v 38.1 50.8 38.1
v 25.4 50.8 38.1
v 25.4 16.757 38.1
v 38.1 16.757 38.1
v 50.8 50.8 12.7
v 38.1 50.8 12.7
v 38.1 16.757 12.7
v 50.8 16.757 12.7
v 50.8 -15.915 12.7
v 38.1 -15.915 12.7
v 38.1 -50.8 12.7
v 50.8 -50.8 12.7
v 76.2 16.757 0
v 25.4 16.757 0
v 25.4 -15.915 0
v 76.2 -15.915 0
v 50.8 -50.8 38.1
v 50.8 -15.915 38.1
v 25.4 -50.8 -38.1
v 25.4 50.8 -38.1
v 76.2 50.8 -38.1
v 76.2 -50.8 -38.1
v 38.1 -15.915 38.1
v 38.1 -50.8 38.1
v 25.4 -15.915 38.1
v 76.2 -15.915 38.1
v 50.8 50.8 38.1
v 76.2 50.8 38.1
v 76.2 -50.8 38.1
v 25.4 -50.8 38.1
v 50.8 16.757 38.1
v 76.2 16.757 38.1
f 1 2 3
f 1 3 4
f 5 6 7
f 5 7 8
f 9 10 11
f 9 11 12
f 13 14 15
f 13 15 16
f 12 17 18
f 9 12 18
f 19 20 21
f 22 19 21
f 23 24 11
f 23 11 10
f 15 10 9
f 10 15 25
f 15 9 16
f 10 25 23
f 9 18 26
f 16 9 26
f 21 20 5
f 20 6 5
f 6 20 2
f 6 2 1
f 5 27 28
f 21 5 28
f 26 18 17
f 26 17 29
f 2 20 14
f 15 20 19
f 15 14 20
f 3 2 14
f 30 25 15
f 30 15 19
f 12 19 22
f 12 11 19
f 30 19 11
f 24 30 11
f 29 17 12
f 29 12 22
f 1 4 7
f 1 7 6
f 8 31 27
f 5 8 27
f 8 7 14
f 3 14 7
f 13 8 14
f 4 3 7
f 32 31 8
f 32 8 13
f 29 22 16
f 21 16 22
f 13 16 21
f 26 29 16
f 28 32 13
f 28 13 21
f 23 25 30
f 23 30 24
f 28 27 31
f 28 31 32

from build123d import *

# Parameters (mm, degrees)
F0_W     = 152.4
F0_H     = 101.6
F1_DEPTH = 38.1
F2_W     = 12.7
F2_H     = 101.6
F3_DEPTH = 25.4
F4_W     = 152.4
F4_H     = 32.6725877821
F5_DEPTH = 38.1
F6_W     = 12.7
F6_H     = 34.8848986059
F7_DEPTH = 76.201


with BuildPart() as f1:
    # F0 (on Top) → F1 (new body, symmetric)
    with BuildSketch(Plane.XY):
        Rectangle(F0_W, F0_H)
    extrude(amount=F1_DEPTH, both=True)

    # F2 (on face) → F3 (cut)
    with BuildSketch(Plane.XY.offset(38.1)):
        with Locations((44.45, 0)):
            Rectangle(F2_W, F2_H)
    extrude(amount=-F3_DEPTH, mode=Mode.SUBTRACT)

    # F4 (on face) → F5 (cut)
    with BuildSketch(Plane.XY.offset(38.1)):
        with Locations((0, 0.421192497)):
            Rectangle(F4_W, F4_H)
    extrude(amount=-F5_DEPTH, mode=Mode.SUBTRACT)

    # F6 (on face) → F7 (intersect, through all)
    with BuildSketch(Plane.XY.offset(38.1)):
        Polygon((38.1, -15.9151013941), (38.1, -50.8), (76.2, -50.8), (76.2, 50.8), (50.8, 50.8), (25.4, 50.8), (25.4, -15.9151013941), align=None)
        with Locations((31.75, -33.357550697)):
            Rectangle(F6_W, F6_H)
    extrude(amount=-F7_DEPTH, mode=Mode.INTERSECT)


solid = f1.part
